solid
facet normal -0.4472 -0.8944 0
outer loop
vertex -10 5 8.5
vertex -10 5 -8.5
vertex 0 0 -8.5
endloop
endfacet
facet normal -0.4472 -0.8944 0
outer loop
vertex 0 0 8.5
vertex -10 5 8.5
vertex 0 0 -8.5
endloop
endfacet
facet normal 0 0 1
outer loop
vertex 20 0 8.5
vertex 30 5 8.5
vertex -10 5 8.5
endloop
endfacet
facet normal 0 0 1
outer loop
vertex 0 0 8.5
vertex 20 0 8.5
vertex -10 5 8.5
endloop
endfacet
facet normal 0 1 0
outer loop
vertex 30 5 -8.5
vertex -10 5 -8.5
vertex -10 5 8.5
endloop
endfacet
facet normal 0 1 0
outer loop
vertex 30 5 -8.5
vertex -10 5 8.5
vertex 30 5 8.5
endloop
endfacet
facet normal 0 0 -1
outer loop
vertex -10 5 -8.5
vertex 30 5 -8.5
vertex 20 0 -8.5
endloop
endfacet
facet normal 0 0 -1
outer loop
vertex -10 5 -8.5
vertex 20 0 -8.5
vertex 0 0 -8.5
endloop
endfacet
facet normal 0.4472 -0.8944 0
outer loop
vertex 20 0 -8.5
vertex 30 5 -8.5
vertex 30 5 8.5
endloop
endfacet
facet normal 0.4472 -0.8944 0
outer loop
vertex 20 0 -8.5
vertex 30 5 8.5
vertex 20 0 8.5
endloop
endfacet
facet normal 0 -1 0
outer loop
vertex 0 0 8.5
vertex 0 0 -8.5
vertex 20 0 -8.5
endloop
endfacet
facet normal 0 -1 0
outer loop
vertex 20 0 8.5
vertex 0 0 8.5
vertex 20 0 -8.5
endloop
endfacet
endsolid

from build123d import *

# Parameters (mm, degrees)
CROQUIS1_W              = 40
CROQUIS1_H              = 17
SALIENTE_EXTRUIR1_DEPTH = 5
CORTAR_EXTRUIR1_DEPTH   = 40
SALIENTE_EXTRUIR2_DEPTH = 17
CORTAR_EXTRUIR2_DEPTH   = 17
SALIENTE_EXTRUIR3_DEPTH = 17


with BuildPart() as part:
    # Croquis1 → Saliente-Extruir1 (new body)
    with BuildSketch(Plane(origin=(0, 0, 0), x_dir=(1, 0, 0), z_dir=(0, 1, 0))):
        Rectangle(CROQUIS1_W, CROQUIS1_H)
    extrude(amount=SALIENTE_EXTRUIR1_DEPTH)

    # Croquis2 → Cortar-Extruir1 (cut)
    with BuildSketch(Plane.XY.offset(8.5)):
        Polygon((-20, 5), (-20, 0), (-10, 0), (-5, 5), align=None)
    extrude(amount=-CORTAR_EXTRUIR1_DEPTH, mode=Mode.SUBTRACT)

    # Croquis3 → Saliente-Extruir2 (add)
    with BuildSketch(Plane(origin=(0, 0, -8.5), x_dir=(-1, 0, 0), z_dir=(0, 0, -1))):
        Polygon((10, 5), (10, 0), (5, 5), align=None)
    extrude(amount=-SALIENTE_EXTRUIR2_DEPTH)

    # Croquis4 → Cortar-Extruir2 (cut)
    with BuildSketch(Plane(origin=(0, 0, -8.5), x_dir=(-1, 0, 0), z_dir=(0, 0, -1))):
        Polygon((10, 5), (0, 0), (10, 0), align=None)
    extrude(amount=-CORTAR_EXTRUIR2_DEPTH, mode=Mode.SUBTRACT)

    # Croquis5 → Saliente-Extruir3 (add)
    with BuildSketch(Plane(origin=(0, 0, -8.5), x_dir=(-1, 0, 0), z_dir=(0, 0, -1))):
        Polygon((-20, 5), (-30, 5), (-20, 0), align=None)
    extrude(amount=-SALIENTE_EXTRUIR3_DEPTH)


solid = part.part
